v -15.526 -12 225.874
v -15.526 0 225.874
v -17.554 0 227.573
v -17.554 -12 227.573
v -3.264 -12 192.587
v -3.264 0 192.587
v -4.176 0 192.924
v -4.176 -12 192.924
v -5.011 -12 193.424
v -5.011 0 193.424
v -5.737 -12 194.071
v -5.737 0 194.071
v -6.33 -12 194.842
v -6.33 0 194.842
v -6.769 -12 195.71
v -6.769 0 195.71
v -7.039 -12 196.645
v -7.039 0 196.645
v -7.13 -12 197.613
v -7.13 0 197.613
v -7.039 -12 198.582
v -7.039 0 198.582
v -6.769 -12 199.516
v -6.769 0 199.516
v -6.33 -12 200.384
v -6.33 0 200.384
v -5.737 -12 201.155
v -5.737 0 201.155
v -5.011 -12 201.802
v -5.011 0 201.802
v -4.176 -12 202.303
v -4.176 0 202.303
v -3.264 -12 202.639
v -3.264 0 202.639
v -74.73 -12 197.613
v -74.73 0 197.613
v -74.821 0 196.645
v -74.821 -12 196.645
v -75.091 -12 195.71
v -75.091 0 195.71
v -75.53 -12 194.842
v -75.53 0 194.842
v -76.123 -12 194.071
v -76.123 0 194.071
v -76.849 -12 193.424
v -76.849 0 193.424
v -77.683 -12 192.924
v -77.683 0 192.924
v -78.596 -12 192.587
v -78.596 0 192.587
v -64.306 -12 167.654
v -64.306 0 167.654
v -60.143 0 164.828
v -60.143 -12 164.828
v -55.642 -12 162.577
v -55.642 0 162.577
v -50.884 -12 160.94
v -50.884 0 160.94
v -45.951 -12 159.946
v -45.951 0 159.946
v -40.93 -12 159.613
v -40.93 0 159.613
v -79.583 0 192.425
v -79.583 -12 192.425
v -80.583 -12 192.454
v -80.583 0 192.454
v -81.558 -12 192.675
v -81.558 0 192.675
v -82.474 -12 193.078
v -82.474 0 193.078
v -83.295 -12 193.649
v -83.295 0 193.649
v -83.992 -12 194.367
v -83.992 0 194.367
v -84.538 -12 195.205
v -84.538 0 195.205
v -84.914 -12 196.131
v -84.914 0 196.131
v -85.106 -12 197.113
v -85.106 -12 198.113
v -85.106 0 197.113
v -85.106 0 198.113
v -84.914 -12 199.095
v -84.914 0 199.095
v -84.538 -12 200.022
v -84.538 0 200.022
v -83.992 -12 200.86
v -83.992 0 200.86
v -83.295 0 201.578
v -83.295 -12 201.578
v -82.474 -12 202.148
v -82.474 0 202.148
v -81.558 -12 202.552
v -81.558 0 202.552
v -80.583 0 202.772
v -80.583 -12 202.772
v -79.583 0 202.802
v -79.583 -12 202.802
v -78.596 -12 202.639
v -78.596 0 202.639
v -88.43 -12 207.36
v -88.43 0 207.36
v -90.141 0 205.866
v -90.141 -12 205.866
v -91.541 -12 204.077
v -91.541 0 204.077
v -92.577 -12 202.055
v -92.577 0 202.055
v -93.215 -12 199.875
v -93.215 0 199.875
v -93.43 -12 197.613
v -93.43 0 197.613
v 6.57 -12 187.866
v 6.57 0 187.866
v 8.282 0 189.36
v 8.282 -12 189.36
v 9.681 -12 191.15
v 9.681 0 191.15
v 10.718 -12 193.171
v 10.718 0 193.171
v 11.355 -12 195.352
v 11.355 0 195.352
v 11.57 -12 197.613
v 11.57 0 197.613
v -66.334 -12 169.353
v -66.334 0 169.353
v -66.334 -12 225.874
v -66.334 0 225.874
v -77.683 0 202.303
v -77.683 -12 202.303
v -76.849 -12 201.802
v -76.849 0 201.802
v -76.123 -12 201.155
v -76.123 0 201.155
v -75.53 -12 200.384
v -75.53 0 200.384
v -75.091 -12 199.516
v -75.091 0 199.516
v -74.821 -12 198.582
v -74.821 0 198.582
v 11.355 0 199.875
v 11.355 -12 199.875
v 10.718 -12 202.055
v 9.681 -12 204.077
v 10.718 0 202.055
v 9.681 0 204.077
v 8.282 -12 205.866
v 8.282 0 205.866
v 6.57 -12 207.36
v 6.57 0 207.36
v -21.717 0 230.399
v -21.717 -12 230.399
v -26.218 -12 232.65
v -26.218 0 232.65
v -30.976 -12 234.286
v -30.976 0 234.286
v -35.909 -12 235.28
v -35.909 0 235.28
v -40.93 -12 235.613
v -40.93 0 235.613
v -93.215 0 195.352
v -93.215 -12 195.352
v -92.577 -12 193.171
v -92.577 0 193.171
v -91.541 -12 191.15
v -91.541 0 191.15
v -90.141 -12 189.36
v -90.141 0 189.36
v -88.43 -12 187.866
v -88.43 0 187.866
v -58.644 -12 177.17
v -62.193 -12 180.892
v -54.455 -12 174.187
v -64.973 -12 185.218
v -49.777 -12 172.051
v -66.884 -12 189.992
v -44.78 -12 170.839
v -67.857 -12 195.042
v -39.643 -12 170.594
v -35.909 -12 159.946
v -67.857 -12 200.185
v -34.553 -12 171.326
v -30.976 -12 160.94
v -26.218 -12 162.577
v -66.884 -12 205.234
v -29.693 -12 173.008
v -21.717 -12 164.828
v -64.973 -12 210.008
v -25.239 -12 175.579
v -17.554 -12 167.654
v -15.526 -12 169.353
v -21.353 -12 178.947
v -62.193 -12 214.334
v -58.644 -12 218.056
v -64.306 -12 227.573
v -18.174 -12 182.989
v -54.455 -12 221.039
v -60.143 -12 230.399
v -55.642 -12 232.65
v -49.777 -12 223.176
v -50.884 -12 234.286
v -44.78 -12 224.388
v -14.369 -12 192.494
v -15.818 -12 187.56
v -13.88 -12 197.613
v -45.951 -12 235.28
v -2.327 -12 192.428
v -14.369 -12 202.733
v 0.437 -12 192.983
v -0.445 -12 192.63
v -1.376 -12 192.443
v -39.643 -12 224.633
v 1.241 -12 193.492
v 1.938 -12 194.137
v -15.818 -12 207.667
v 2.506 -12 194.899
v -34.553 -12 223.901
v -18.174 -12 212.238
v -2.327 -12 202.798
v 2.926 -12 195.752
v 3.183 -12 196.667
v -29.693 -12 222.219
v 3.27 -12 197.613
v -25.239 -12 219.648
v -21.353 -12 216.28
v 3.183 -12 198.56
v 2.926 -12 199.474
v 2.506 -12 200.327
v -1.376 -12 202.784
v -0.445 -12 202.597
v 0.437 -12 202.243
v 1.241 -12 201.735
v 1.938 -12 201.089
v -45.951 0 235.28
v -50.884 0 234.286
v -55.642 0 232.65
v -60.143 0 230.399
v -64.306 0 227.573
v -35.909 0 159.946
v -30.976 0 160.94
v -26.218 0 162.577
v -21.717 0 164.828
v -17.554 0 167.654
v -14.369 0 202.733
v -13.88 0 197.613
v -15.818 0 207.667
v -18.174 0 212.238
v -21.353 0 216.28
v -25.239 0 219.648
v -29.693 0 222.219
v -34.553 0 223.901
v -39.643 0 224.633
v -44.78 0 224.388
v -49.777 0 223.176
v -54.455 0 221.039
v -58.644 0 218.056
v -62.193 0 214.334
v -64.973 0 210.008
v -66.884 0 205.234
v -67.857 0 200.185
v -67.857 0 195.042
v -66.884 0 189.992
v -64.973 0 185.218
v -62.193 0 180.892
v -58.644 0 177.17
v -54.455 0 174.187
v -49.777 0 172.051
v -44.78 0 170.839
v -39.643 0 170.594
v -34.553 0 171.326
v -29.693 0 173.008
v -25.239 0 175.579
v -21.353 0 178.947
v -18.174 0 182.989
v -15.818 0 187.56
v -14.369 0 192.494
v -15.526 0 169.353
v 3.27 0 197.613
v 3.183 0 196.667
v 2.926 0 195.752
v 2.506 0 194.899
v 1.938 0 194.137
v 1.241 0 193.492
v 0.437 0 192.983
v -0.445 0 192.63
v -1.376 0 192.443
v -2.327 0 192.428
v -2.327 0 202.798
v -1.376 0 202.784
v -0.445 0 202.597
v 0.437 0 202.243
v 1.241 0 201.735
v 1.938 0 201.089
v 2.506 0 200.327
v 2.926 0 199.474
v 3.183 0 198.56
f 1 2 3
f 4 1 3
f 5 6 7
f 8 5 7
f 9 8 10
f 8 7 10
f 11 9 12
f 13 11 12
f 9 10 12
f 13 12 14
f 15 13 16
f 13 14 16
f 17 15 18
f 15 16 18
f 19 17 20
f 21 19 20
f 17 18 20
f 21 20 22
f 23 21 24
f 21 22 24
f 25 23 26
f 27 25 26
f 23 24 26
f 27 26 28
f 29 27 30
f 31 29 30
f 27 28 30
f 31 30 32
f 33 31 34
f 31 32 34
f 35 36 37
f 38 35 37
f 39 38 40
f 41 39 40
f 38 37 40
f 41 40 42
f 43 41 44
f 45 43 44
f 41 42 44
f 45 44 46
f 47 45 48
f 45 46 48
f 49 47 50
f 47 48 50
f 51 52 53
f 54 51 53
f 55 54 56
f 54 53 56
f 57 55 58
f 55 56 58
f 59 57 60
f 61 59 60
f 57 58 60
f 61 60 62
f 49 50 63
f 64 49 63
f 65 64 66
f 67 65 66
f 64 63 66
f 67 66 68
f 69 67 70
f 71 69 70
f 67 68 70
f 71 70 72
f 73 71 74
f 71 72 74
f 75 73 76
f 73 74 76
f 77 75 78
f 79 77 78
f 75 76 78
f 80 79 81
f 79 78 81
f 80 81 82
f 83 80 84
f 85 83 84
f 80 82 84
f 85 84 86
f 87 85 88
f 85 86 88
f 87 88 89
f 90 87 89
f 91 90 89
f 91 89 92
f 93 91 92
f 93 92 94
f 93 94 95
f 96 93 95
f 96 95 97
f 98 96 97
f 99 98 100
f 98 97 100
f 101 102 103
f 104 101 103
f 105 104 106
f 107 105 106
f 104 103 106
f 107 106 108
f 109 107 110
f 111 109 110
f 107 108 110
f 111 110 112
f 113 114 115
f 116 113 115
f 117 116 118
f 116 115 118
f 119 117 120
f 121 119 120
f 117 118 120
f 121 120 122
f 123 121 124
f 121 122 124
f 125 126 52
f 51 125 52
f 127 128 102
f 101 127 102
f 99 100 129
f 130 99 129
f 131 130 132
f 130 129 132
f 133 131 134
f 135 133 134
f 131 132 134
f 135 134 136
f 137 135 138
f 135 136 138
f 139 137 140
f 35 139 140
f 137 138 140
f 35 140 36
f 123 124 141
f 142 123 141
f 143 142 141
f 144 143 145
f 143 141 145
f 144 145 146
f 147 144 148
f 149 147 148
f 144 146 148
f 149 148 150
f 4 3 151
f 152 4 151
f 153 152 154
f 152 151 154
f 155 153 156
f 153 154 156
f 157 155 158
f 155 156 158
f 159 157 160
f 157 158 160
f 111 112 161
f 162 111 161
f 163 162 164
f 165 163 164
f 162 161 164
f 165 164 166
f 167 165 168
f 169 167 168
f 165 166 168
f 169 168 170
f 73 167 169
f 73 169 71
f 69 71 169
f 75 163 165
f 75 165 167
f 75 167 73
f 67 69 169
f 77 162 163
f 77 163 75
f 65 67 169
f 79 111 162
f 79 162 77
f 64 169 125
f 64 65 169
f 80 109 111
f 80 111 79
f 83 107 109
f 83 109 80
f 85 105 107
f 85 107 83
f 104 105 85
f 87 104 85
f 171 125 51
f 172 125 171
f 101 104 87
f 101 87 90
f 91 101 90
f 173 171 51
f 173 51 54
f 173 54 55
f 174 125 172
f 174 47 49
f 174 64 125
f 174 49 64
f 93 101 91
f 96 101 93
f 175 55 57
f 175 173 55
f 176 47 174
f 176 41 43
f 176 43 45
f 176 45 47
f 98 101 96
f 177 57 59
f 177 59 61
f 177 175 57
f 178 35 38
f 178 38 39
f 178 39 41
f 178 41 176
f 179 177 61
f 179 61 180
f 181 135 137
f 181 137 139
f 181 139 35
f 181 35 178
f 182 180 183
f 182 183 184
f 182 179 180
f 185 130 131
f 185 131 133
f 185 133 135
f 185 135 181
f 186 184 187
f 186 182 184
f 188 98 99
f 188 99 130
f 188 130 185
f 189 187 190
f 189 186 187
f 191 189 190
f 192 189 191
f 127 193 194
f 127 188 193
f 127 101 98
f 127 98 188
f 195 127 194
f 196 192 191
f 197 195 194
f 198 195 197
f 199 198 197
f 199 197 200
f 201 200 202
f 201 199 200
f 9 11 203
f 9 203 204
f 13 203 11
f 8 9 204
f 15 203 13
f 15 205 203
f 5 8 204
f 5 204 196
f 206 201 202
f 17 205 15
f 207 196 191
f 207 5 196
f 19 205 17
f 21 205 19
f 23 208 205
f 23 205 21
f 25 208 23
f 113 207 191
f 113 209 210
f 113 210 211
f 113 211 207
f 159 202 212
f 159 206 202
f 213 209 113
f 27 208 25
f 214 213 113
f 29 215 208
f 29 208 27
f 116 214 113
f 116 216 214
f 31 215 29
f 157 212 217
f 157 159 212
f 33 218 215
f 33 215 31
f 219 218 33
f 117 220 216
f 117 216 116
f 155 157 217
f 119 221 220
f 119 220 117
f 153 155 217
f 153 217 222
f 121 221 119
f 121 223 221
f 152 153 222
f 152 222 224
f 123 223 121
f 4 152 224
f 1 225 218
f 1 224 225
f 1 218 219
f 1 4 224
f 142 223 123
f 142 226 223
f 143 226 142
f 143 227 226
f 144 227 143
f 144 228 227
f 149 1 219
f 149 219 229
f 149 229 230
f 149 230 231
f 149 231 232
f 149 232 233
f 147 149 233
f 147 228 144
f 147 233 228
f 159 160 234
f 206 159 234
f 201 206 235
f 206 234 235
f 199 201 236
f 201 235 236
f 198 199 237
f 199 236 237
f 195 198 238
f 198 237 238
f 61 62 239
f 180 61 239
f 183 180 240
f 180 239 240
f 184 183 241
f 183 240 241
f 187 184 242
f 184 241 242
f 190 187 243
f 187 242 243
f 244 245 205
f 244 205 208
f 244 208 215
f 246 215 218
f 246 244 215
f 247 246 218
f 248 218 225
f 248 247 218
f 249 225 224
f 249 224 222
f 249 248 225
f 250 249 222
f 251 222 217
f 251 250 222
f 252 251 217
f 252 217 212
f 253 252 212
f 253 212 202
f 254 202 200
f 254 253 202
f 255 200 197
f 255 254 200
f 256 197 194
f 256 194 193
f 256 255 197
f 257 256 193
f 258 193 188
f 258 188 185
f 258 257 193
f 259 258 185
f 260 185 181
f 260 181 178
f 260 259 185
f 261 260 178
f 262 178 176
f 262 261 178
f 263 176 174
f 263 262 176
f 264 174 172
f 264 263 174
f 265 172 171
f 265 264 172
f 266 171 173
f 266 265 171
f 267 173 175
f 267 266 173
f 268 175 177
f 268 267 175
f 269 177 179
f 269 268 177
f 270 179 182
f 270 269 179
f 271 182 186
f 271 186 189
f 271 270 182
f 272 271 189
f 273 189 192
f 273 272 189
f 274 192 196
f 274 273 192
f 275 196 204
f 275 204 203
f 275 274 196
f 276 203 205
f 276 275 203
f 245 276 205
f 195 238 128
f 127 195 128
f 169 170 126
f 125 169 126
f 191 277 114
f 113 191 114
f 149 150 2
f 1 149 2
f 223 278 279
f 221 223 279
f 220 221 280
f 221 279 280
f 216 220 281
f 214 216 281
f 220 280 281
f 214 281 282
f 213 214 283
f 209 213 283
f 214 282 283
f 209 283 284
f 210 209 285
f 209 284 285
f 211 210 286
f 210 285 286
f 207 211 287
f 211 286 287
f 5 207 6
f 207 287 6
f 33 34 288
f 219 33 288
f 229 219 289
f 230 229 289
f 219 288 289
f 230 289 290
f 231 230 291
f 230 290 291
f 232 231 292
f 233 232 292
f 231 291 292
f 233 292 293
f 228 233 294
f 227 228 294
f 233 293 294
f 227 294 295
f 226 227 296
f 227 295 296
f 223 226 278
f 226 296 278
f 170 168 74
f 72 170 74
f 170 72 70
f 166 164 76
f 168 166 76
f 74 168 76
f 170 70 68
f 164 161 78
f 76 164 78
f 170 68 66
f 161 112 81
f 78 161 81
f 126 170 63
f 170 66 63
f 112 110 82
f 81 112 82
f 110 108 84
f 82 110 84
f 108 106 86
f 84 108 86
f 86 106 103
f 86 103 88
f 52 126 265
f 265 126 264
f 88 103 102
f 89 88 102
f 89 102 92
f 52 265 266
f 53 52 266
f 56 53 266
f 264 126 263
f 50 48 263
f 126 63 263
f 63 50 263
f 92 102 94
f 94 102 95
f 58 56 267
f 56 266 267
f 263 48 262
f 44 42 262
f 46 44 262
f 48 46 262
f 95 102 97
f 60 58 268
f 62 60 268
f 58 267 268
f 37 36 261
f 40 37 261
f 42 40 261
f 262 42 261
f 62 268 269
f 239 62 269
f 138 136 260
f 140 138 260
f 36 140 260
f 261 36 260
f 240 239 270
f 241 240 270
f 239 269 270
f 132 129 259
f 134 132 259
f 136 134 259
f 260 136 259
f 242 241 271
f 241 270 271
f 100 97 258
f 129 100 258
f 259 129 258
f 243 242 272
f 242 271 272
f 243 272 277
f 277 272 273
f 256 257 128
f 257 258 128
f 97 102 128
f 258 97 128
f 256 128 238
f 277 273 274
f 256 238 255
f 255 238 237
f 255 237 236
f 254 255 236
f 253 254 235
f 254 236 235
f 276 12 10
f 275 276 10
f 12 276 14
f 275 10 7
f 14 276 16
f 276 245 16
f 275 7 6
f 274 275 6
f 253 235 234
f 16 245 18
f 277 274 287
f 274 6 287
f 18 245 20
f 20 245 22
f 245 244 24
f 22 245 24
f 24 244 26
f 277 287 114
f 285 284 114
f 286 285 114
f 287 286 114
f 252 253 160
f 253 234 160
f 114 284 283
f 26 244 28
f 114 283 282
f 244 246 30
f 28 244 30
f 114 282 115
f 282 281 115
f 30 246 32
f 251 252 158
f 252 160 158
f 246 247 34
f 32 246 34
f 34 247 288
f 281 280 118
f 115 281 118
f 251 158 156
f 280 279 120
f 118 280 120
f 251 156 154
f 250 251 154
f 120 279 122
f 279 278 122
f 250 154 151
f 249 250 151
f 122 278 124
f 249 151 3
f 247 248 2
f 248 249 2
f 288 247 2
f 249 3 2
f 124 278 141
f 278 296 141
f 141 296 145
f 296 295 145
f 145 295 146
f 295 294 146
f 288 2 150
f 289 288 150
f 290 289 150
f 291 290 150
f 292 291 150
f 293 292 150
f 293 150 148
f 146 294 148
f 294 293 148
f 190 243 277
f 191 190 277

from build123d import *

# Parameters (mm, degrees)
F0_R     = 27.05
F1_DEPTH = 12


with BuildPart() as f1:
    # F0 (on Front) → F1 (new body)
    with BuildSketch(Plane.XZ):
        with BuildLine():
            Line((-66.333731852, 225.8735977012), (-88.4299040636, 207.3600747496))
            ThreePointArc((-88.4299040636, 207.3600747496), (-83.0164485889, 209.5079378807), (-77.2292867797, 208.8540461453))
            ThreePointArc((-77.2292867797, 208.8540461453), (-72.9336199483, 218.1013786467), (-66.333731852, 225.8735977012))
        make_face()
        with BuildLine():
            ThreePointArc((-88.4299040636, 207.3600747496), (-92.1069823157, 203.0905059798), (-93.4299040636, 197.6132804047))
            ThreePointArc((-93.4299040636, 197.6132804047), (-92.1069823157, 192.1360548297), (-88.4299040636, 187.8664860599))
            ThreePointArc((-88.4299040636, 187.8664860599), (-83.0164485889, 185.7186229288), (-77.2292867797, 186.3725146642))
            ThreePointArc((-77.2292867797, 186.3725146642), (-78.0429869708, 189.4512293681), (-78.5960579098, 192.5872626533))
            ThreePointArc((-78.5960579098, 192.5872626533), (-85.1299040636, 197.6132804047), (-78.5960579098, 202.6392981562))
            ThreePointArc((-78.5960579098, 202.6392981562), (-78.0429869708, 205.7753314414), (-77.2292867797, 208.8540461453))
            ThreePointArc((-77.2292867797, 208.8540461453), (-83.0164485889, 209.5079378807), (-88.4299040636, 207.3600747496))
        make_face()
        with BuildLine():
            ThreePointArc((-64.3060042971, 167.6540090873), (-53.2900757844, 161.6796449773), (-40.9299040636, 159.6132804047))
            ThreePointArc((-40.9299040636, 159.6132804047), (-28.5697323428, 161.6796449773), (-17.5538038301, 167.6540090873))
            Line((-17.5538038301, 167.6540090873), (-15.5260762752, 169.3529631083))
            ThreePointArc((-15.5260762752, 169.3529631083), (-8.9261881789, 177.1251821628), (-4.6305213476, 186.3725146642))
            ThreePointArc((-4.6305213476, 186.3725146642), (-3.8168211564, 189.4512293681), (-3.2637502175, 192.5872626533))
            ThreePointArc((-3.2637502175, 192.5872626533), (-7.1299040636, 197.6132804047), (-3.2637502175, 202.6392981562))
            ThreePointArc((-3.2637502175, 202.6392981562), (-3.8168211564, 205.7753314414), (-4.6305213476, 208.8540461453))
            ThreePointArc((-4.6305213476, 208.8540461453), (-8.9261881789, 218.1013786467), (-15.5260762752, 225.8735977012))
            Line((-15.5260762752, 225.8735977012), (-17.5538038301, 227.5725517222))
            ThreePointArc((-17.5538038301, 227.5725517222), (-28.5697323428, 233.5469158322), (-40.9299040636, 235.6132804047))
            ThreePointArc((-40.9299040636, 235.6132804047), (-53.2900757844, 233.5469158322), (-64.3060042971, 227.5725517222))
            Line((-64.3060042971, 227.5725517222), (-66.333731852, 225.8735977012))
            ThreePointArc((-66.333731852, 225.8735977012), (-72.9336199483, 218.1013786467), (-77.2292867797, 208.8540461453))
            ThreePointArc((-77.2292867797, 208.8540461453), (-78.0429869708, 205.7753314414), (-78.5960579098, 202.6392981562))
            ThreePointArc((-78.5960579098, 202.6392981562), (-75.8082539087, 200.783769326), (-74.7299040636, 197.6132804047))
            ThreePointArc((-74.7299040636, 197.6132804047), (-75.8082539087, 194.4427914835), (-78.5960579098, 192.5872626533))
            ThreePointArc((-78.5960579098, 192.5872626533), (-78.0429869708, 189.4512293681), (-77.2292867797, 186.3725146642))
            ThreePointArc((-77.2292867797, 186.3725146642), (-72.9336199483, 177.1251821628), (-66.333731852, 169.3529631083))
            Line((-66.333731852, 169.3529631083), (-64.3060042971, 167.6540090873))
        make_face()
        with Locations((-40.9299040636, 197.6132804047)):
            Circle(F0_R, mode=Mode.SUBTRACT)
        with BuildLine():
            ThreePointArc((-77.2292867797, 186.3725146642), (-83.0164485889, 185.7186229288), (-88.4299040636, 187.8664860599))
            Line((-88.4299040636, 187.8664860599), (-66.333731852, 169.3529631083))
            ThreePointArc((-66.333731852, 169.3529631083), (-72.9336199483, 177.1251821628), (-77.2292867797, 186.3725146642))
        make_face()
        with BuildLine():
            ThreePointArc((-4.6305213476, 186.3725146642), (-8.9261881789, 177.1251821628), (-15.5260762752, 169.3529631083))
            Line((-15.5260762752, 169.3529631083), (6.5700959364, 187.8664860599))
            ThreePointArc((6.5700959364, 187.8664860599), (1.1566404616, 185.7186229288), (-4.6305213476, 186.3725146642))
        make_face()
        with BuildLine():
            ThreePointArc((-4.6305213476, 208.8540461453), (1.1566404616, 209.5079378807), (6.5700959364, 207.3600747496))
            Line((6.5700959364, 207.3600747496), (-15.5260762752, 225.8735977012))
            ThreePointArc((-15.5260762752, 225.8735977012), (-8.9261881789, 218.1013786467), (-4.6305213476, 208.8540461453))
        make_face()
        with BuildLine():
            ThreePointArc((6.5700959364, 187.8664860599), (10.2471741992, 192.1360548507), (11.5700959364, 197.613280452))
            ThreePointArc((11.5700959364, 197.613280452), (10.2471741776, 203.0905060008), (6.5700959364, 207.3600747496))
            ThreePointArc((6.5700959364, 207.3600747496), (1.1566404616, 209.5079378807), (-4.6305213476, 208.8540461453))
            ThreePointArc((-4.6305213476, 208.8540461453), (-3.8168211564, 205.7753314414), (-3.2637502175, 202.6392981562))
            ThreePointArc((-3.2637502175, 202.6392981562), (1.2405848577, 201.7349305597), (3.2700959364, 197.6132804047))
            ThreePointArc((3.2700959364, 197.6132804047), (1.2405848577, 193.4916302498), (-3.2637502175, 192.5872626533))
            ThreePointArc((-3.2637502175, 192.5872626533), (-3.8168211564, 189.4512293681), (-4.6305213476, 186.3725146642))
            ThreePointArc((-4.6305213476, 186.3725146642), (1.1566404616, 185.7186229288), (6.5700959364, 187.8664860599))
        make_face()
    extrude(amount=F1_DEPTH)


solid = f1.part
